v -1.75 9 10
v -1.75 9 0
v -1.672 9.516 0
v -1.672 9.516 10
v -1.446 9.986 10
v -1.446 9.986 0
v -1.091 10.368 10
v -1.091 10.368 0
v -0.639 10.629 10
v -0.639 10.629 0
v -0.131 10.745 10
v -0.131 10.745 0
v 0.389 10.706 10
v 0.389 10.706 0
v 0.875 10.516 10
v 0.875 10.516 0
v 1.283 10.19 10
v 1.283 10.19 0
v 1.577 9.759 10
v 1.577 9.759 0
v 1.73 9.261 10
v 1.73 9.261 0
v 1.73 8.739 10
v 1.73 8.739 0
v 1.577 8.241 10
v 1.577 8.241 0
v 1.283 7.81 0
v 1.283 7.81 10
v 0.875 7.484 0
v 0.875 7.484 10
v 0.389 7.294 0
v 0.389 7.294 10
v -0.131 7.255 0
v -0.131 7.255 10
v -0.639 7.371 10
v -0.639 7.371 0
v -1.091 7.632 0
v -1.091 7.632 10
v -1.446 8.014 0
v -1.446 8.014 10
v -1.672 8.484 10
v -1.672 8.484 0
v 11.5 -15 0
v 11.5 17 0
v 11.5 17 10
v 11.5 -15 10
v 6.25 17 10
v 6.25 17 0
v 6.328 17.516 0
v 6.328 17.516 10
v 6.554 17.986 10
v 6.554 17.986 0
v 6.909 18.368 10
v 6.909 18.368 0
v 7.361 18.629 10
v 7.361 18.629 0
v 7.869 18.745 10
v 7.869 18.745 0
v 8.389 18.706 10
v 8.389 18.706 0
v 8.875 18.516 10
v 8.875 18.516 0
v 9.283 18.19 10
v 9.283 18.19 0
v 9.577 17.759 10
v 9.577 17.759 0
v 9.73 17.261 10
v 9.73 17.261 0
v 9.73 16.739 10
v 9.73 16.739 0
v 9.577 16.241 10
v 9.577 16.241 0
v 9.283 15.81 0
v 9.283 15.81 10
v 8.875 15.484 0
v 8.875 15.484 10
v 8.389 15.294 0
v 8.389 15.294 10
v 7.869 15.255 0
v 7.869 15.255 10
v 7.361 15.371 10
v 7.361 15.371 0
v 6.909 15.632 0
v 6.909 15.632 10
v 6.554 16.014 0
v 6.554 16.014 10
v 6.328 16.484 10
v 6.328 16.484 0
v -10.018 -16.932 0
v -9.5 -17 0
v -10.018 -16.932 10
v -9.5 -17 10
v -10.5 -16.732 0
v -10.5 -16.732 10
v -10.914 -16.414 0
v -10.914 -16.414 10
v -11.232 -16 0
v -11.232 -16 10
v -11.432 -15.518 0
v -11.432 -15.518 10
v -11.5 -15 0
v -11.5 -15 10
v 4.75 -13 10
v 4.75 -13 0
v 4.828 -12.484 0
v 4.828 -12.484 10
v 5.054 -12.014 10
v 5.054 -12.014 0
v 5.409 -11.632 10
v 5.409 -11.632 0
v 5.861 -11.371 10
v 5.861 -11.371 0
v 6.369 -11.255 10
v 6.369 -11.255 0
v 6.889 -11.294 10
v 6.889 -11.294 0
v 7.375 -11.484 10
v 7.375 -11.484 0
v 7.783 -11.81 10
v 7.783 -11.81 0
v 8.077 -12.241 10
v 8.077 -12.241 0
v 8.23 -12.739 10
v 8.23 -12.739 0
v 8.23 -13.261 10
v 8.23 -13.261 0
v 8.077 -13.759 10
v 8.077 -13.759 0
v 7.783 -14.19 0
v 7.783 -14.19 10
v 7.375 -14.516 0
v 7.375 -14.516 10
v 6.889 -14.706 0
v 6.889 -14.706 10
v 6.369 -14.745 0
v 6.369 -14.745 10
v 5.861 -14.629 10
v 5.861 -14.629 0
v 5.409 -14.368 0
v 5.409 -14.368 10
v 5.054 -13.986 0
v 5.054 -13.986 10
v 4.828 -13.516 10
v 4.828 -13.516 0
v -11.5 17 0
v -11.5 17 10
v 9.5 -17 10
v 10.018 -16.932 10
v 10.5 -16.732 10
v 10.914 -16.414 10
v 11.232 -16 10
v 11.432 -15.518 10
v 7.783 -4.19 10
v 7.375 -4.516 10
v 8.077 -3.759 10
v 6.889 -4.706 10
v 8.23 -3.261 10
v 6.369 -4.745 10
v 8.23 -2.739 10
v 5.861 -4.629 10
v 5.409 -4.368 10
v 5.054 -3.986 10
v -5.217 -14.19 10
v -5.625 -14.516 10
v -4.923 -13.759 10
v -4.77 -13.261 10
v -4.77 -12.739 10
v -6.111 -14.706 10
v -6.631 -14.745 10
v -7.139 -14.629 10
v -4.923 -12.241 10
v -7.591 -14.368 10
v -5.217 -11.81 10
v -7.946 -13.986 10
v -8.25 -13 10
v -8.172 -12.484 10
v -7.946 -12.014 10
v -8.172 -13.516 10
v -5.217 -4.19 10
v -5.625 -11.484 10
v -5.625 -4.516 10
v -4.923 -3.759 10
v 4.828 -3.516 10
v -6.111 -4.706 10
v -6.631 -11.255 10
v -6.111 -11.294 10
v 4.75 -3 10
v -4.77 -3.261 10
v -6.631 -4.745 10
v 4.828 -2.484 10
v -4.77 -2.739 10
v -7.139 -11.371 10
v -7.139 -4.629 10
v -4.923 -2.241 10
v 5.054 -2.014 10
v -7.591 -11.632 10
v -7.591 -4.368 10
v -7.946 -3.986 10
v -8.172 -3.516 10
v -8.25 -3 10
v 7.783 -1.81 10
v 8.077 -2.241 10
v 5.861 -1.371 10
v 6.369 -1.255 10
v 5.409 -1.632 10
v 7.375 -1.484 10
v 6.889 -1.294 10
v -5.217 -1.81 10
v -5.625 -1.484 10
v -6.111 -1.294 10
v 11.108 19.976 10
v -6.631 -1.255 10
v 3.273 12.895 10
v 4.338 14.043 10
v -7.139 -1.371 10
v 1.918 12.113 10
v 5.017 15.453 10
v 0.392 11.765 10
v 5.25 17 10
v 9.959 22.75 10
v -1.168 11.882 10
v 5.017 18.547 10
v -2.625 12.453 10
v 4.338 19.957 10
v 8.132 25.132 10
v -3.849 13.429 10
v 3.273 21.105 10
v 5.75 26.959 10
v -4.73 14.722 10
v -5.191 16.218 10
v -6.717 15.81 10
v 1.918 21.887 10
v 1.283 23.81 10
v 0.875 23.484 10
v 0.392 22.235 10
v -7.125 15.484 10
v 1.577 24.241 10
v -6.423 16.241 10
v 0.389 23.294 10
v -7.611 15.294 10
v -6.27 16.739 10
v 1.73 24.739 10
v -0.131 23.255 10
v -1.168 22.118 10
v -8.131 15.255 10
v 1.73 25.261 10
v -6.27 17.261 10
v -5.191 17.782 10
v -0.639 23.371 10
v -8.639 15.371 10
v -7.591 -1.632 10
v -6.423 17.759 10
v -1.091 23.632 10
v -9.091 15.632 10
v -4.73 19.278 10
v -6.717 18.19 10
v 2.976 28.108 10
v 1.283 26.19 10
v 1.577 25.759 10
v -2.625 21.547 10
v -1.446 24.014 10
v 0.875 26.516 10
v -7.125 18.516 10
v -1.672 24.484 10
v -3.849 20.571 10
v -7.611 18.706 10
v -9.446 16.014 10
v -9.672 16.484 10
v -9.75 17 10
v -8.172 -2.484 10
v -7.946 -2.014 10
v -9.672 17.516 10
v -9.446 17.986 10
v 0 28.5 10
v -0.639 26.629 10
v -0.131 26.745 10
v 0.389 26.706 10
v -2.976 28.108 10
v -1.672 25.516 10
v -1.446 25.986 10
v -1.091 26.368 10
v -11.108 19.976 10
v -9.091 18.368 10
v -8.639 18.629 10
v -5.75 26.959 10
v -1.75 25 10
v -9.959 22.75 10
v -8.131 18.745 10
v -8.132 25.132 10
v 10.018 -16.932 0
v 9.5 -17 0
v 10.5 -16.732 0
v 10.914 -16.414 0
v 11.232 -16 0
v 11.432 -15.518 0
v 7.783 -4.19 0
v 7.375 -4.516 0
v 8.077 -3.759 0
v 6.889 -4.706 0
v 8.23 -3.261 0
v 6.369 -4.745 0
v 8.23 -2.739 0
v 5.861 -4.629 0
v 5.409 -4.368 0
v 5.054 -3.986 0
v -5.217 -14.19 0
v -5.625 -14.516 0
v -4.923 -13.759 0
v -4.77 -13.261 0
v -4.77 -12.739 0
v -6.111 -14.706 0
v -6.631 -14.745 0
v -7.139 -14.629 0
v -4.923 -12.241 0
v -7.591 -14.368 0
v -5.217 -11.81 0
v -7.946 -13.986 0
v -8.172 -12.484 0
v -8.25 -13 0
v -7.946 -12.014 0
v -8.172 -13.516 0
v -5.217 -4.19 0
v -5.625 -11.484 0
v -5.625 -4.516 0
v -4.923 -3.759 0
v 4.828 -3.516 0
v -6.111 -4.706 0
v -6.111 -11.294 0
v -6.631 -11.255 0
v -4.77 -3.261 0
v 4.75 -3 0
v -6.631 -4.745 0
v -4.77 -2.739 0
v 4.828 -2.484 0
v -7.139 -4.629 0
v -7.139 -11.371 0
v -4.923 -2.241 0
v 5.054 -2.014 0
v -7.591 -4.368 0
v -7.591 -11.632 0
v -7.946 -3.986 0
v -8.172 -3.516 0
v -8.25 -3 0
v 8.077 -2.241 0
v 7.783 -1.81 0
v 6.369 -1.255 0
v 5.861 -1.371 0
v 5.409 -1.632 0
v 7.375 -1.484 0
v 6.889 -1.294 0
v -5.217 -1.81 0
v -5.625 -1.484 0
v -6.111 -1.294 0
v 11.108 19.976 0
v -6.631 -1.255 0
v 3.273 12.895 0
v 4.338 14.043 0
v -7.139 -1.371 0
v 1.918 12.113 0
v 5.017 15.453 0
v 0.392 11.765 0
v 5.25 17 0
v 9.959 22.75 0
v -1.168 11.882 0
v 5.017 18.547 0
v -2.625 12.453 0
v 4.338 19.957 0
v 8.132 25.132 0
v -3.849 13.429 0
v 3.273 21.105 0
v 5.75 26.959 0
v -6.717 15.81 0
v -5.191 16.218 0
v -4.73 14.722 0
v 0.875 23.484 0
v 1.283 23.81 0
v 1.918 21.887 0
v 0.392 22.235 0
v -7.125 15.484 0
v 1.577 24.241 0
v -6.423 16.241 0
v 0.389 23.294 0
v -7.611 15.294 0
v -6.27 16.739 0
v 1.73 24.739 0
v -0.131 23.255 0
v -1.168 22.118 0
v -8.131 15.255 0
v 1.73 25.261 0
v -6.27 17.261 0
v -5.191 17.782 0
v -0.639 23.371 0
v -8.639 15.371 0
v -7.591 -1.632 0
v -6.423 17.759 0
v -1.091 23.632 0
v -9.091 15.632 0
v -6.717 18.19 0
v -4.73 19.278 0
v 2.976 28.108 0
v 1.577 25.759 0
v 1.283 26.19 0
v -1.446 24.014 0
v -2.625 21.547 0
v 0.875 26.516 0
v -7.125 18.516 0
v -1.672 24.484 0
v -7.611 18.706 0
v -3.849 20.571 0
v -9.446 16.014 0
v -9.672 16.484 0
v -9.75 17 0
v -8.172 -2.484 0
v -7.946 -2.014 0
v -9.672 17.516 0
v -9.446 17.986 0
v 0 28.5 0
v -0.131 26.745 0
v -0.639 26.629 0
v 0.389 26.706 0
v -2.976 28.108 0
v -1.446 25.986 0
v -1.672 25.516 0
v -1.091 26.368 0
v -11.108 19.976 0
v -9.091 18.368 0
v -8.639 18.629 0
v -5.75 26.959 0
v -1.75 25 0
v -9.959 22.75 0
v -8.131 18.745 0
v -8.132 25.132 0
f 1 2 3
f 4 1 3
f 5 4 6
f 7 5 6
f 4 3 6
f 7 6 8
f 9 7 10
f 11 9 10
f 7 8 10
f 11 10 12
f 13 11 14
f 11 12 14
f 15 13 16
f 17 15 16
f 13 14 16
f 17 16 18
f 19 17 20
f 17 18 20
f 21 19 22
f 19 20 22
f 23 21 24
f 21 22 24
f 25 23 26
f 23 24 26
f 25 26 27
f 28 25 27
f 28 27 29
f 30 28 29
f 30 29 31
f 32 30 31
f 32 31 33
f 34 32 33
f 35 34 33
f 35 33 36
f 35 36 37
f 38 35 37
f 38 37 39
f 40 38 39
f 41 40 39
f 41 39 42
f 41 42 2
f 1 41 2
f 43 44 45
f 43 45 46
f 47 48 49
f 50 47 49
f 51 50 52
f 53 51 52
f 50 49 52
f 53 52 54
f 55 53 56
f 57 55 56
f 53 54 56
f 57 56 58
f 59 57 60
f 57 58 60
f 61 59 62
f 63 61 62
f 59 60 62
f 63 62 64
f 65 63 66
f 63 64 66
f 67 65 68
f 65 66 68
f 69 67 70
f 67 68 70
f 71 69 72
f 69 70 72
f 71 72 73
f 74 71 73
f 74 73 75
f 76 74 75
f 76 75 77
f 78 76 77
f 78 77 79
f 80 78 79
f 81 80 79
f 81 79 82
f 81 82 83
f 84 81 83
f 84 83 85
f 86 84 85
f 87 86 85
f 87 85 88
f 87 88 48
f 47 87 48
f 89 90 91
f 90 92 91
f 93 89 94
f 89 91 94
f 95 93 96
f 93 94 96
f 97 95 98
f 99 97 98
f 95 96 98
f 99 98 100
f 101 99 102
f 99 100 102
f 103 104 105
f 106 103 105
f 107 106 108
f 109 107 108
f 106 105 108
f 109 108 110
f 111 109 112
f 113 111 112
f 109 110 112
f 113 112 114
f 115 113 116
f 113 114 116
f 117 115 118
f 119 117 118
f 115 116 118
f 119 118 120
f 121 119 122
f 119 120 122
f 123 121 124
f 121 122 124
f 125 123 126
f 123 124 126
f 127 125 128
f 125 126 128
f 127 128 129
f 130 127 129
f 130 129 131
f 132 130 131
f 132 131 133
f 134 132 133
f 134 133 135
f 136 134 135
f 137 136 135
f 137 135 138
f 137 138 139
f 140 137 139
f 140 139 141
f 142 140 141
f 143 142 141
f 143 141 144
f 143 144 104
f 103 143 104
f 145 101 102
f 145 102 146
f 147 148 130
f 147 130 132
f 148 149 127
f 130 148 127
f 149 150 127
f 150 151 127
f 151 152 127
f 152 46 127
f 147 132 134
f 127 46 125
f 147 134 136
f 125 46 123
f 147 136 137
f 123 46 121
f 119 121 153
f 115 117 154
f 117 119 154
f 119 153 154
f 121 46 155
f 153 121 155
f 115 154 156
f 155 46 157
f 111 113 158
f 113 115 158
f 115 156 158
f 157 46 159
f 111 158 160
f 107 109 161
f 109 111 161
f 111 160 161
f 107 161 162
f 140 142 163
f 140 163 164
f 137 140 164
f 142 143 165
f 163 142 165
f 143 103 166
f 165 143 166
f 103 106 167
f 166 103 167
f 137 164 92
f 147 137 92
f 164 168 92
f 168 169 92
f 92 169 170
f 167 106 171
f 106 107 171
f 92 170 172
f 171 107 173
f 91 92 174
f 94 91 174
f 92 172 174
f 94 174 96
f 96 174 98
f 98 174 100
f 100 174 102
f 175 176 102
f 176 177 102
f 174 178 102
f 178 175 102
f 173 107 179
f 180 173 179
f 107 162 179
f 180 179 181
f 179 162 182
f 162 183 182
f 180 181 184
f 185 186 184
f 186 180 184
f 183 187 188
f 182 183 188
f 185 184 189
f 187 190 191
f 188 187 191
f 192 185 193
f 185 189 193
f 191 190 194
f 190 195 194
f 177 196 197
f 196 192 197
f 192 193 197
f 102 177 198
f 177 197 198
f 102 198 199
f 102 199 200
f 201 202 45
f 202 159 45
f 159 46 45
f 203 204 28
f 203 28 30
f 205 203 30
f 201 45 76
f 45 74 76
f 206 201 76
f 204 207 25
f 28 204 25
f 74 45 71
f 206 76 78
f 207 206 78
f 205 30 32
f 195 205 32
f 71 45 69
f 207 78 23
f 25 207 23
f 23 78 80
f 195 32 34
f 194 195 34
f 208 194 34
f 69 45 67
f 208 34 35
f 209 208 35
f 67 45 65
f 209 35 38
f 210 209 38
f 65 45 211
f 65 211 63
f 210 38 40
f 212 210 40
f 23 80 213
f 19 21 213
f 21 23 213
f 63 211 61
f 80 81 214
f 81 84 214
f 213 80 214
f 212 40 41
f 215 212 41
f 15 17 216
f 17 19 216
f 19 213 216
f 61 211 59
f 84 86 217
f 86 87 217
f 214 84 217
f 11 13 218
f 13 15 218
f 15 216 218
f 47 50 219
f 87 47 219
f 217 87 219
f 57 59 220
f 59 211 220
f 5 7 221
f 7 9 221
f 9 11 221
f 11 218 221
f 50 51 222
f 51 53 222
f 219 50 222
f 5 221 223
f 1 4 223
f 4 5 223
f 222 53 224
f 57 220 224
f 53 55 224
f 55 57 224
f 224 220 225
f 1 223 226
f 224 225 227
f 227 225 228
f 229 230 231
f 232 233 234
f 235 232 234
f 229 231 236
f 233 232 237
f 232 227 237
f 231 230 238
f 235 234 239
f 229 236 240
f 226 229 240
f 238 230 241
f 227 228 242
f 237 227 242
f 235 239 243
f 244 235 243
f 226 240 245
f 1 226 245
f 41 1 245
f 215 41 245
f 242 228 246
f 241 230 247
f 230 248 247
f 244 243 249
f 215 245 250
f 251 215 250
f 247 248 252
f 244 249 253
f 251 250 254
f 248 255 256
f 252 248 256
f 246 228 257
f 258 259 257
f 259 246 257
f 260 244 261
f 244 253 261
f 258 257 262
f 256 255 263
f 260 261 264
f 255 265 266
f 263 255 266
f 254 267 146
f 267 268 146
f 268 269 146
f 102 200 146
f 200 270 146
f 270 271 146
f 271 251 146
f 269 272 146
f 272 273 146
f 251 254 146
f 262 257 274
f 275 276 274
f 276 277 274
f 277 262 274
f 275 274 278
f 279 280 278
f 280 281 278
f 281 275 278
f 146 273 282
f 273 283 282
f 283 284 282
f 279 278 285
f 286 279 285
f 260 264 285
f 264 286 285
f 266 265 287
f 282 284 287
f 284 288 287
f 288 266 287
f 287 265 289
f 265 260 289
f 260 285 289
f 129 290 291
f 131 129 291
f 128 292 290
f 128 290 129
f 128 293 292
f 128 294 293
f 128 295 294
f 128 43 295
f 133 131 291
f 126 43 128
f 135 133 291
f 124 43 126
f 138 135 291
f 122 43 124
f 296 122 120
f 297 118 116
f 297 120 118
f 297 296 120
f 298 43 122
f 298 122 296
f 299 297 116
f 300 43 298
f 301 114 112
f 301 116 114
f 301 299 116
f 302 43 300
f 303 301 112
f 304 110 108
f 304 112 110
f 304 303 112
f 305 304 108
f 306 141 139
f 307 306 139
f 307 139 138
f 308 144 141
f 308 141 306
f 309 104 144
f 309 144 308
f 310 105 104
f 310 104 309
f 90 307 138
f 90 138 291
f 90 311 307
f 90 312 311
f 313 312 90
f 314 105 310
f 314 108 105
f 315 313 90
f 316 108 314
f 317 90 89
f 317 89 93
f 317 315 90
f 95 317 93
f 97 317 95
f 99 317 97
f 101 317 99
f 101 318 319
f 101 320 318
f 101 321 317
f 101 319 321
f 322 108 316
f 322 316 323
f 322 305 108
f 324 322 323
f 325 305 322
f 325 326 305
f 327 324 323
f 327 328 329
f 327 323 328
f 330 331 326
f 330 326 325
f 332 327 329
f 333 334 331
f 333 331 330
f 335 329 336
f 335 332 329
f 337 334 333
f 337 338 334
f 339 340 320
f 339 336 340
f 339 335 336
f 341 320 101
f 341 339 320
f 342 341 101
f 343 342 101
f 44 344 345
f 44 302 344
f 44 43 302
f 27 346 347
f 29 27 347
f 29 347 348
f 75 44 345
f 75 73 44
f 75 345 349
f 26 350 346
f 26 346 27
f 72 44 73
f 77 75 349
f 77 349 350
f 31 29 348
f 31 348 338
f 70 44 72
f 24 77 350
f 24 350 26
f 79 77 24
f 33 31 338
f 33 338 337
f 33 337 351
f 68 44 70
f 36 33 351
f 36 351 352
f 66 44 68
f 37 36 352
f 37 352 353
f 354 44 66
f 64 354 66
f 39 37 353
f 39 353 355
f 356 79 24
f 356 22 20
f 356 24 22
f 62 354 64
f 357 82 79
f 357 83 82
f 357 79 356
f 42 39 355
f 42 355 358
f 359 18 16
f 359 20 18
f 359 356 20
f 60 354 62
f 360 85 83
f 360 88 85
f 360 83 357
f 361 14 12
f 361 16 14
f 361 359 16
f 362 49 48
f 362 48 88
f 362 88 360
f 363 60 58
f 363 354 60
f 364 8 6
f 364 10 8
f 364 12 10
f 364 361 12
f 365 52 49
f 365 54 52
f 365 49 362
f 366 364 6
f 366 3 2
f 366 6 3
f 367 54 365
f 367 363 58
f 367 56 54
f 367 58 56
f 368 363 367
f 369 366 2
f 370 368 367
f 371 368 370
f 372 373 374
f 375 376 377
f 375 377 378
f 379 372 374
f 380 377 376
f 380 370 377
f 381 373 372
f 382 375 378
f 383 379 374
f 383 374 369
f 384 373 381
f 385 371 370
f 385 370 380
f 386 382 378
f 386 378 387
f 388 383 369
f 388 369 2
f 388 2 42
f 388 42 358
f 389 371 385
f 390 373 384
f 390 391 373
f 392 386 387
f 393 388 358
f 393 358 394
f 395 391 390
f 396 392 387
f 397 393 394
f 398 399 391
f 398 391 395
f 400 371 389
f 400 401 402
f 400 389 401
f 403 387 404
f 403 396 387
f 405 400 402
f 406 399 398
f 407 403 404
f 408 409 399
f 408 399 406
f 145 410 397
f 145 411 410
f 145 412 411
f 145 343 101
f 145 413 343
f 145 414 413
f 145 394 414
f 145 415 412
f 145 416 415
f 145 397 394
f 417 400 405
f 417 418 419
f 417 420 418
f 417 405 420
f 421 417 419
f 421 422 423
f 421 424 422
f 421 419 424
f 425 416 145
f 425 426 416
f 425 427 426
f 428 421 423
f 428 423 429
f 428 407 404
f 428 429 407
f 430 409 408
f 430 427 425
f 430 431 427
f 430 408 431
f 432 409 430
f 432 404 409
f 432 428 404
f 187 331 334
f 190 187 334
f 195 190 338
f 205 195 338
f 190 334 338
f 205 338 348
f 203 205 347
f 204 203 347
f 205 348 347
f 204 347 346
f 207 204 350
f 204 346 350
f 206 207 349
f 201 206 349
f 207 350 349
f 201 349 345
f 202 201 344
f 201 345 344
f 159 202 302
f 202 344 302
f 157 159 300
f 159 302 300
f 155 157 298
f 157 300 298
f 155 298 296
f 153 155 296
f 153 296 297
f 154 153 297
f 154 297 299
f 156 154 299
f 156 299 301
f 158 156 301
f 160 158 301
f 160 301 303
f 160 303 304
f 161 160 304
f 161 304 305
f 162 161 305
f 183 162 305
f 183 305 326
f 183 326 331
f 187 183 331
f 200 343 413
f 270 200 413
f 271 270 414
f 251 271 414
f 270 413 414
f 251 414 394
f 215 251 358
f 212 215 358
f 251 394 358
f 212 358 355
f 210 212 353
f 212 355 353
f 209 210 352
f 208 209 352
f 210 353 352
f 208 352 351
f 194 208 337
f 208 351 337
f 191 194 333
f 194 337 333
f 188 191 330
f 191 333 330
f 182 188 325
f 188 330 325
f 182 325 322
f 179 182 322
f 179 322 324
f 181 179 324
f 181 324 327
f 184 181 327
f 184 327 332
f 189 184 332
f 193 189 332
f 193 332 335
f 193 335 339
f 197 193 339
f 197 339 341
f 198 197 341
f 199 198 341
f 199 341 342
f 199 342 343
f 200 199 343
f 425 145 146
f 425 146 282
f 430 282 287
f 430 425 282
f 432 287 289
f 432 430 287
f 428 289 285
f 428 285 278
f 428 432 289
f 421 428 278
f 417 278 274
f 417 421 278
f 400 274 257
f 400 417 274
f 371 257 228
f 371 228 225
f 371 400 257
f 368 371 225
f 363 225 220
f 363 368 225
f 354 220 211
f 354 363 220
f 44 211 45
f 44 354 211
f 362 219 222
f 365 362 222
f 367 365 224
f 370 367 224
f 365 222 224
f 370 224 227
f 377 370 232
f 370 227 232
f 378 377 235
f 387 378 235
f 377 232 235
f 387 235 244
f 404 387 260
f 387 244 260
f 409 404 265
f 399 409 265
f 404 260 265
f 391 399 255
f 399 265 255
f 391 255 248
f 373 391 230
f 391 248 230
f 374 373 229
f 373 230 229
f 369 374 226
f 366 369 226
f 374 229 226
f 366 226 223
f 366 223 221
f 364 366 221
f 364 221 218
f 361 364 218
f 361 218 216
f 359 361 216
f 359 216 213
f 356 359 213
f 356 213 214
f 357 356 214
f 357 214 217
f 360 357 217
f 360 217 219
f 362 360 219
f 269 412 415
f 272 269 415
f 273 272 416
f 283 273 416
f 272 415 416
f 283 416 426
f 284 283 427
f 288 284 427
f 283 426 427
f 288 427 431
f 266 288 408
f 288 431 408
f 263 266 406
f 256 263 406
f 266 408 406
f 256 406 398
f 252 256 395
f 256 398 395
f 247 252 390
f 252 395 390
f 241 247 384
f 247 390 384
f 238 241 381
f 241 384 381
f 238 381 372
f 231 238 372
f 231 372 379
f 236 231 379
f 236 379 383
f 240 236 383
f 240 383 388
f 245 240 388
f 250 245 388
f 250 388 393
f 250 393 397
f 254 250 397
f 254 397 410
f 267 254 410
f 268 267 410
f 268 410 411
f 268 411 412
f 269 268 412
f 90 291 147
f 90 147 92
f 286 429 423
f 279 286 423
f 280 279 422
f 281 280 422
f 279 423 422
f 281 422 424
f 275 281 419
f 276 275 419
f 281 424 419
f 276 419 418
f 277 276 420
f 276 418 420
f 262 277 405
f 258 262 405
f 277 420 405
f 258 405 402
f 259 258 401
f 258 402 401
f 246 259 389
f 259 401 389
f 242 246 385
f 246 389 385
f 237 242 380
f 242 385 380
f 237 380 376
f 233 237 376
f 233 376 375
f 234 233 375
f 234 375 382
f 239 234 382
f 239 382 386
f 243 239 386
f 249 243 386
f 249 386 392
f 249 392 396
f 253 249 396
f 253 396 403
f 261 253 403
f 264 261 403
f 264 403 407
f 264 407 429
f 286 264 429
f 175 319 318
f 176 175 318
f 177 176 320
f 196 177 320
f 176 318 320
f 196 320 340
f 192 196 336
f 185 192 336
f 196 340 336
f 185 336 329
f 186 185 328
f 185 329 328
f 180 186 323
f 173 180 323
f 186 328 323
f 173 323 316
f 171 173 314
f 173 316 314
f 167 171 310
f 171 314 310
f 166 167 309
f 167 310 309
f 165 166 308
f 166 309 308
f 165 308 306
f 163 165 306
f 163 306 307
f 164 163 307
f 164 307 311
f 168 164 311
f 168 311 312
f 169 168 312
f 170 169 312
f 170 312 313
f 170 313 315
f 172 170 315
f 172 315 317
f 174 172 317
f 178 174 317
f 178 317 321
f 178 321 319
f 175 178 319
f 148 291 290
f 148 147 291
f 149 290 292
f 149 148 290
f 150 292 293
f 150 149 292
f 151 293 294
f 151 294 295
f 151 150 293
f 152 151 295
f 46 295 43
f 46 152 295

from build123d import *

# Parameters (mm, degrees)
BOSS_EXTRUDE1_DEPTH = 10
CUT_EXTRUDE1_REACH  = 34.319
SKETCH4_R           = 5.25
CUT_EXTRUDE2_REACH  = 34.319
SKETCH6_R           = 1.75
CUT_EXTRUDE3_REACH  = 34.319
SKETCH7_R           = 1.75
FILLET1_R           = 2


with BuildPart() as part:
    # Sketch2 → Boss-Extrude1 (new body)
    with BuildSketch(Plane.XY):
        with BuildLine():
            Line((11.5, -17), (-11.5, -17))
            Line((-11.5, -17), (-11.5, 17))
            ThreePointArc((-11.5, 17), (0, 28.5), (11.5, 17))
            Line((11.5, 17), (11.5, -17))
        make_face()
    extrude(amount=BOSS_EXTRUDE1_DEPTH)

    # Sketch4 → Cut-Extrude1 (cut, up to next)
    with BuildSketch(Plane.XY.offset(10), mode=Mode.PRIVATE) as cut_extrude1_sk1:
        with Locations((0, 17)):
            Circle(SKETCH4_R)
    cut_extrude1_tool1 = extrude(cut_extrude1_sk1.sketch, amount=-CUT_EXTRUDE1_REACH, mode=Mode.PRIVATE) & part.part
    add(cut_extrude1_tool1.solids().sort_by_distance((0, 17, 10))[0], mode=Mode.SUBTRACT)

    # Sketch6 → Cut-Extrude2 (cut, up to next)
    with BuildSketch(Plane(origin=(0, 0, 0), x_dir=(-1, 0, 0), z_dir=(0, 0, -1)), mode=Mode.PRIVATE) as cut_extrude2_sk1:
        with Locations((0, 25)):
            Circle(SKETCH6_R)
    cut_extrude2_tool1 = extrude(cut_extrude2_sk1.sketch, amount=-CUT_EXTRUDE2_REACH, mode=Mode.PRIVATE) & part.part
    # Sketch6 → Cut-Extrude2 (cut, up to next)
    with BuildSketch(Plane(origin=(0, 0, 0), x_dir=(-1, 0, 0), z_dir=(0, 0, -1)), mode=Mode.PRIVATE) as cut_extrude2_sk2:
        with Locations((8, 17)):
            Circle(SKETCH6_R)
    cut_extrude2_tool2 = extrude(cut_extrude2_sk2.sketch, amount=-CUT_EXTRUDE2_REACH, mode=Mode.PRIVATE) & part.part
    # Sketch6 → Cut-Extrude2 (cut, up to next)
    with BuildSketch(Plane(origin=(0, 0, 0), x_dir=(-1, 0, 0), z_dir=(0, 0, -1)), mode=Mode.PRIVATE) as cut_extrude2_sk3:
        with Locations((0, 9)):
            Circle(SKETCH6_R)
    cut_extrude2_tool3 = extrude(cut_extrude2_sk3.sketch, amount=-CUT_EXTRUDE2_REACH, mode=Mode.PRIVATE) & part.part
    # Sketch6 → Cut-Extrude2 (cut, up to next)
    with BuildSketch(Plane(origin=(0, 0, 0), x_dir=(-1, 0, 0), z_dir=(0, 0, -1)), mode=Mode.PRIVATE) as cut_extrude2_sk4:
        with Locations((-8, 17)):
            Circle(SKETCH6_R)
    cut_extrude2_tool4 = extrude(cut_extrude2_sk4.sketch, amount=-CUT_EXTRUDE2_REACH, mode=Mode.PRIVATE) & part.part
    add(cut_extrude2_tool1.solids().sort_by_distance((0, 25, 0))[0], mode=Mode.SUBTRACT)
    add(cut_extrude2_tool2.solids().sort_by_distance((-8, 17, 0))[0], mode=Mode.SUBTRACT)
    add(cut_extrude2_tool3.solids().sort_by_distance((0, 9, 0))[0], mode=Mode.SUBTRACT)
    add(cut_extrude2_tool4.solids().sort_by_distance((8, 17, 0))[0], mode=Mode.SUBTRACT)

    # Sketch7 → Cut-Extrude3 (cut, up to next)
    with BuildSketch(Plane(origin=(0, 0, 0), x_dir=(-1, 0, 0), z_dir=(0, 0, -1)), mode=Mode.PRIVATE) as cut_extrude3_sk1:
        with Locations((-6.5, -3)):
            Circle(SKETCH7_R)
    cut_extrude3_tool1 = extrude(cut_extrude3_sk1.sketch, amount=-CUT_EXTRUDE3_REACH, mode=Mode.PRIVATE) & part.part
    # Sketch7 → Cut-Extrude3 (cut, up to next)
    with BuildSketch(Plane(origin=(0, 0, 0), x_dir=(-1, 0, 0), z_dir=(0, 0, -1)), mode=Mode.PRIVATE) as cut_extrude3_sk2:
        with Locations((6.5, -3)):
            Circle(SKETCH7_R)
    cut_extrude3_tool2 = extrude(cut_extrude3_sk2.sketch, amount=-CUT_EXTRUDE3_REACH, mode=Mode.PRIVATE) & part.part
    # Sketch7 → Cut-Extrude3 (cut, up to next)
    with BuildSketch(Plane(origin=(0, 0, 0), x_dir=(-1, 0, 0), z_dir=(0, 0, -1)), mode=Mode.PRIVATE) as cut_extrude3_sk3:
        with Locations((6.5, -13)):
            Circle(SKETCH7_R)
    cut_extrude3_tool3 = extrude(cut_extrude3_sk3.sketch, amount=-CUT_EXTRUDE3_REACH, mode=Mode.PRIVATE) & part.part
    # Sketch7 → Cut-Extrude3 (cut, up to next)
    with BuildSketch(Plane(origin=(0, 0, 0), x_dir=(-1, 0, 0), z_dir=(0, 0, -1)), mode=Mode.PRIVATE) as cut_extrude3_sk4:
        with Locations((-6.5, -13)):
            Circle(SKETCH7_R)
    cut_extrude3_tool4 = extrude(cut_extrude3_sk4.sketch, amount=-CUT_EXTRUDE3_REACH, mode=Mode.PRIVATE) & part.part
    add(cut_extrude3_tool1.solids().sort_by_distance((6.5, -3, 0))[0], mode=Mode.SUBTRACT)
    add(cut_extrude3_tool2.solids().sort_by_distance((-6.5, -3, 0))[0], mode=Mode.SUBTRACT)
    add(cut_extrude3_tool3.solids().sort_by_distance((-6.5, -13, 0))[0], mode=Mode.SUBTRACT)
    add(cut_extrude3_tool4.solids().sort_by_distance((6.5, -13, 0))[0], mode=Mode.SUBTRACT)

    # Fillet1
    fillet1_edges = [part.edges().sort_by_distance(p)[0] for p in [
        (11.5, -17, 5),
        (-11.5, -17, 5),
    ]]
    fillet(fillet1_edges, radius=FILLET1_R)


solid = part.part
